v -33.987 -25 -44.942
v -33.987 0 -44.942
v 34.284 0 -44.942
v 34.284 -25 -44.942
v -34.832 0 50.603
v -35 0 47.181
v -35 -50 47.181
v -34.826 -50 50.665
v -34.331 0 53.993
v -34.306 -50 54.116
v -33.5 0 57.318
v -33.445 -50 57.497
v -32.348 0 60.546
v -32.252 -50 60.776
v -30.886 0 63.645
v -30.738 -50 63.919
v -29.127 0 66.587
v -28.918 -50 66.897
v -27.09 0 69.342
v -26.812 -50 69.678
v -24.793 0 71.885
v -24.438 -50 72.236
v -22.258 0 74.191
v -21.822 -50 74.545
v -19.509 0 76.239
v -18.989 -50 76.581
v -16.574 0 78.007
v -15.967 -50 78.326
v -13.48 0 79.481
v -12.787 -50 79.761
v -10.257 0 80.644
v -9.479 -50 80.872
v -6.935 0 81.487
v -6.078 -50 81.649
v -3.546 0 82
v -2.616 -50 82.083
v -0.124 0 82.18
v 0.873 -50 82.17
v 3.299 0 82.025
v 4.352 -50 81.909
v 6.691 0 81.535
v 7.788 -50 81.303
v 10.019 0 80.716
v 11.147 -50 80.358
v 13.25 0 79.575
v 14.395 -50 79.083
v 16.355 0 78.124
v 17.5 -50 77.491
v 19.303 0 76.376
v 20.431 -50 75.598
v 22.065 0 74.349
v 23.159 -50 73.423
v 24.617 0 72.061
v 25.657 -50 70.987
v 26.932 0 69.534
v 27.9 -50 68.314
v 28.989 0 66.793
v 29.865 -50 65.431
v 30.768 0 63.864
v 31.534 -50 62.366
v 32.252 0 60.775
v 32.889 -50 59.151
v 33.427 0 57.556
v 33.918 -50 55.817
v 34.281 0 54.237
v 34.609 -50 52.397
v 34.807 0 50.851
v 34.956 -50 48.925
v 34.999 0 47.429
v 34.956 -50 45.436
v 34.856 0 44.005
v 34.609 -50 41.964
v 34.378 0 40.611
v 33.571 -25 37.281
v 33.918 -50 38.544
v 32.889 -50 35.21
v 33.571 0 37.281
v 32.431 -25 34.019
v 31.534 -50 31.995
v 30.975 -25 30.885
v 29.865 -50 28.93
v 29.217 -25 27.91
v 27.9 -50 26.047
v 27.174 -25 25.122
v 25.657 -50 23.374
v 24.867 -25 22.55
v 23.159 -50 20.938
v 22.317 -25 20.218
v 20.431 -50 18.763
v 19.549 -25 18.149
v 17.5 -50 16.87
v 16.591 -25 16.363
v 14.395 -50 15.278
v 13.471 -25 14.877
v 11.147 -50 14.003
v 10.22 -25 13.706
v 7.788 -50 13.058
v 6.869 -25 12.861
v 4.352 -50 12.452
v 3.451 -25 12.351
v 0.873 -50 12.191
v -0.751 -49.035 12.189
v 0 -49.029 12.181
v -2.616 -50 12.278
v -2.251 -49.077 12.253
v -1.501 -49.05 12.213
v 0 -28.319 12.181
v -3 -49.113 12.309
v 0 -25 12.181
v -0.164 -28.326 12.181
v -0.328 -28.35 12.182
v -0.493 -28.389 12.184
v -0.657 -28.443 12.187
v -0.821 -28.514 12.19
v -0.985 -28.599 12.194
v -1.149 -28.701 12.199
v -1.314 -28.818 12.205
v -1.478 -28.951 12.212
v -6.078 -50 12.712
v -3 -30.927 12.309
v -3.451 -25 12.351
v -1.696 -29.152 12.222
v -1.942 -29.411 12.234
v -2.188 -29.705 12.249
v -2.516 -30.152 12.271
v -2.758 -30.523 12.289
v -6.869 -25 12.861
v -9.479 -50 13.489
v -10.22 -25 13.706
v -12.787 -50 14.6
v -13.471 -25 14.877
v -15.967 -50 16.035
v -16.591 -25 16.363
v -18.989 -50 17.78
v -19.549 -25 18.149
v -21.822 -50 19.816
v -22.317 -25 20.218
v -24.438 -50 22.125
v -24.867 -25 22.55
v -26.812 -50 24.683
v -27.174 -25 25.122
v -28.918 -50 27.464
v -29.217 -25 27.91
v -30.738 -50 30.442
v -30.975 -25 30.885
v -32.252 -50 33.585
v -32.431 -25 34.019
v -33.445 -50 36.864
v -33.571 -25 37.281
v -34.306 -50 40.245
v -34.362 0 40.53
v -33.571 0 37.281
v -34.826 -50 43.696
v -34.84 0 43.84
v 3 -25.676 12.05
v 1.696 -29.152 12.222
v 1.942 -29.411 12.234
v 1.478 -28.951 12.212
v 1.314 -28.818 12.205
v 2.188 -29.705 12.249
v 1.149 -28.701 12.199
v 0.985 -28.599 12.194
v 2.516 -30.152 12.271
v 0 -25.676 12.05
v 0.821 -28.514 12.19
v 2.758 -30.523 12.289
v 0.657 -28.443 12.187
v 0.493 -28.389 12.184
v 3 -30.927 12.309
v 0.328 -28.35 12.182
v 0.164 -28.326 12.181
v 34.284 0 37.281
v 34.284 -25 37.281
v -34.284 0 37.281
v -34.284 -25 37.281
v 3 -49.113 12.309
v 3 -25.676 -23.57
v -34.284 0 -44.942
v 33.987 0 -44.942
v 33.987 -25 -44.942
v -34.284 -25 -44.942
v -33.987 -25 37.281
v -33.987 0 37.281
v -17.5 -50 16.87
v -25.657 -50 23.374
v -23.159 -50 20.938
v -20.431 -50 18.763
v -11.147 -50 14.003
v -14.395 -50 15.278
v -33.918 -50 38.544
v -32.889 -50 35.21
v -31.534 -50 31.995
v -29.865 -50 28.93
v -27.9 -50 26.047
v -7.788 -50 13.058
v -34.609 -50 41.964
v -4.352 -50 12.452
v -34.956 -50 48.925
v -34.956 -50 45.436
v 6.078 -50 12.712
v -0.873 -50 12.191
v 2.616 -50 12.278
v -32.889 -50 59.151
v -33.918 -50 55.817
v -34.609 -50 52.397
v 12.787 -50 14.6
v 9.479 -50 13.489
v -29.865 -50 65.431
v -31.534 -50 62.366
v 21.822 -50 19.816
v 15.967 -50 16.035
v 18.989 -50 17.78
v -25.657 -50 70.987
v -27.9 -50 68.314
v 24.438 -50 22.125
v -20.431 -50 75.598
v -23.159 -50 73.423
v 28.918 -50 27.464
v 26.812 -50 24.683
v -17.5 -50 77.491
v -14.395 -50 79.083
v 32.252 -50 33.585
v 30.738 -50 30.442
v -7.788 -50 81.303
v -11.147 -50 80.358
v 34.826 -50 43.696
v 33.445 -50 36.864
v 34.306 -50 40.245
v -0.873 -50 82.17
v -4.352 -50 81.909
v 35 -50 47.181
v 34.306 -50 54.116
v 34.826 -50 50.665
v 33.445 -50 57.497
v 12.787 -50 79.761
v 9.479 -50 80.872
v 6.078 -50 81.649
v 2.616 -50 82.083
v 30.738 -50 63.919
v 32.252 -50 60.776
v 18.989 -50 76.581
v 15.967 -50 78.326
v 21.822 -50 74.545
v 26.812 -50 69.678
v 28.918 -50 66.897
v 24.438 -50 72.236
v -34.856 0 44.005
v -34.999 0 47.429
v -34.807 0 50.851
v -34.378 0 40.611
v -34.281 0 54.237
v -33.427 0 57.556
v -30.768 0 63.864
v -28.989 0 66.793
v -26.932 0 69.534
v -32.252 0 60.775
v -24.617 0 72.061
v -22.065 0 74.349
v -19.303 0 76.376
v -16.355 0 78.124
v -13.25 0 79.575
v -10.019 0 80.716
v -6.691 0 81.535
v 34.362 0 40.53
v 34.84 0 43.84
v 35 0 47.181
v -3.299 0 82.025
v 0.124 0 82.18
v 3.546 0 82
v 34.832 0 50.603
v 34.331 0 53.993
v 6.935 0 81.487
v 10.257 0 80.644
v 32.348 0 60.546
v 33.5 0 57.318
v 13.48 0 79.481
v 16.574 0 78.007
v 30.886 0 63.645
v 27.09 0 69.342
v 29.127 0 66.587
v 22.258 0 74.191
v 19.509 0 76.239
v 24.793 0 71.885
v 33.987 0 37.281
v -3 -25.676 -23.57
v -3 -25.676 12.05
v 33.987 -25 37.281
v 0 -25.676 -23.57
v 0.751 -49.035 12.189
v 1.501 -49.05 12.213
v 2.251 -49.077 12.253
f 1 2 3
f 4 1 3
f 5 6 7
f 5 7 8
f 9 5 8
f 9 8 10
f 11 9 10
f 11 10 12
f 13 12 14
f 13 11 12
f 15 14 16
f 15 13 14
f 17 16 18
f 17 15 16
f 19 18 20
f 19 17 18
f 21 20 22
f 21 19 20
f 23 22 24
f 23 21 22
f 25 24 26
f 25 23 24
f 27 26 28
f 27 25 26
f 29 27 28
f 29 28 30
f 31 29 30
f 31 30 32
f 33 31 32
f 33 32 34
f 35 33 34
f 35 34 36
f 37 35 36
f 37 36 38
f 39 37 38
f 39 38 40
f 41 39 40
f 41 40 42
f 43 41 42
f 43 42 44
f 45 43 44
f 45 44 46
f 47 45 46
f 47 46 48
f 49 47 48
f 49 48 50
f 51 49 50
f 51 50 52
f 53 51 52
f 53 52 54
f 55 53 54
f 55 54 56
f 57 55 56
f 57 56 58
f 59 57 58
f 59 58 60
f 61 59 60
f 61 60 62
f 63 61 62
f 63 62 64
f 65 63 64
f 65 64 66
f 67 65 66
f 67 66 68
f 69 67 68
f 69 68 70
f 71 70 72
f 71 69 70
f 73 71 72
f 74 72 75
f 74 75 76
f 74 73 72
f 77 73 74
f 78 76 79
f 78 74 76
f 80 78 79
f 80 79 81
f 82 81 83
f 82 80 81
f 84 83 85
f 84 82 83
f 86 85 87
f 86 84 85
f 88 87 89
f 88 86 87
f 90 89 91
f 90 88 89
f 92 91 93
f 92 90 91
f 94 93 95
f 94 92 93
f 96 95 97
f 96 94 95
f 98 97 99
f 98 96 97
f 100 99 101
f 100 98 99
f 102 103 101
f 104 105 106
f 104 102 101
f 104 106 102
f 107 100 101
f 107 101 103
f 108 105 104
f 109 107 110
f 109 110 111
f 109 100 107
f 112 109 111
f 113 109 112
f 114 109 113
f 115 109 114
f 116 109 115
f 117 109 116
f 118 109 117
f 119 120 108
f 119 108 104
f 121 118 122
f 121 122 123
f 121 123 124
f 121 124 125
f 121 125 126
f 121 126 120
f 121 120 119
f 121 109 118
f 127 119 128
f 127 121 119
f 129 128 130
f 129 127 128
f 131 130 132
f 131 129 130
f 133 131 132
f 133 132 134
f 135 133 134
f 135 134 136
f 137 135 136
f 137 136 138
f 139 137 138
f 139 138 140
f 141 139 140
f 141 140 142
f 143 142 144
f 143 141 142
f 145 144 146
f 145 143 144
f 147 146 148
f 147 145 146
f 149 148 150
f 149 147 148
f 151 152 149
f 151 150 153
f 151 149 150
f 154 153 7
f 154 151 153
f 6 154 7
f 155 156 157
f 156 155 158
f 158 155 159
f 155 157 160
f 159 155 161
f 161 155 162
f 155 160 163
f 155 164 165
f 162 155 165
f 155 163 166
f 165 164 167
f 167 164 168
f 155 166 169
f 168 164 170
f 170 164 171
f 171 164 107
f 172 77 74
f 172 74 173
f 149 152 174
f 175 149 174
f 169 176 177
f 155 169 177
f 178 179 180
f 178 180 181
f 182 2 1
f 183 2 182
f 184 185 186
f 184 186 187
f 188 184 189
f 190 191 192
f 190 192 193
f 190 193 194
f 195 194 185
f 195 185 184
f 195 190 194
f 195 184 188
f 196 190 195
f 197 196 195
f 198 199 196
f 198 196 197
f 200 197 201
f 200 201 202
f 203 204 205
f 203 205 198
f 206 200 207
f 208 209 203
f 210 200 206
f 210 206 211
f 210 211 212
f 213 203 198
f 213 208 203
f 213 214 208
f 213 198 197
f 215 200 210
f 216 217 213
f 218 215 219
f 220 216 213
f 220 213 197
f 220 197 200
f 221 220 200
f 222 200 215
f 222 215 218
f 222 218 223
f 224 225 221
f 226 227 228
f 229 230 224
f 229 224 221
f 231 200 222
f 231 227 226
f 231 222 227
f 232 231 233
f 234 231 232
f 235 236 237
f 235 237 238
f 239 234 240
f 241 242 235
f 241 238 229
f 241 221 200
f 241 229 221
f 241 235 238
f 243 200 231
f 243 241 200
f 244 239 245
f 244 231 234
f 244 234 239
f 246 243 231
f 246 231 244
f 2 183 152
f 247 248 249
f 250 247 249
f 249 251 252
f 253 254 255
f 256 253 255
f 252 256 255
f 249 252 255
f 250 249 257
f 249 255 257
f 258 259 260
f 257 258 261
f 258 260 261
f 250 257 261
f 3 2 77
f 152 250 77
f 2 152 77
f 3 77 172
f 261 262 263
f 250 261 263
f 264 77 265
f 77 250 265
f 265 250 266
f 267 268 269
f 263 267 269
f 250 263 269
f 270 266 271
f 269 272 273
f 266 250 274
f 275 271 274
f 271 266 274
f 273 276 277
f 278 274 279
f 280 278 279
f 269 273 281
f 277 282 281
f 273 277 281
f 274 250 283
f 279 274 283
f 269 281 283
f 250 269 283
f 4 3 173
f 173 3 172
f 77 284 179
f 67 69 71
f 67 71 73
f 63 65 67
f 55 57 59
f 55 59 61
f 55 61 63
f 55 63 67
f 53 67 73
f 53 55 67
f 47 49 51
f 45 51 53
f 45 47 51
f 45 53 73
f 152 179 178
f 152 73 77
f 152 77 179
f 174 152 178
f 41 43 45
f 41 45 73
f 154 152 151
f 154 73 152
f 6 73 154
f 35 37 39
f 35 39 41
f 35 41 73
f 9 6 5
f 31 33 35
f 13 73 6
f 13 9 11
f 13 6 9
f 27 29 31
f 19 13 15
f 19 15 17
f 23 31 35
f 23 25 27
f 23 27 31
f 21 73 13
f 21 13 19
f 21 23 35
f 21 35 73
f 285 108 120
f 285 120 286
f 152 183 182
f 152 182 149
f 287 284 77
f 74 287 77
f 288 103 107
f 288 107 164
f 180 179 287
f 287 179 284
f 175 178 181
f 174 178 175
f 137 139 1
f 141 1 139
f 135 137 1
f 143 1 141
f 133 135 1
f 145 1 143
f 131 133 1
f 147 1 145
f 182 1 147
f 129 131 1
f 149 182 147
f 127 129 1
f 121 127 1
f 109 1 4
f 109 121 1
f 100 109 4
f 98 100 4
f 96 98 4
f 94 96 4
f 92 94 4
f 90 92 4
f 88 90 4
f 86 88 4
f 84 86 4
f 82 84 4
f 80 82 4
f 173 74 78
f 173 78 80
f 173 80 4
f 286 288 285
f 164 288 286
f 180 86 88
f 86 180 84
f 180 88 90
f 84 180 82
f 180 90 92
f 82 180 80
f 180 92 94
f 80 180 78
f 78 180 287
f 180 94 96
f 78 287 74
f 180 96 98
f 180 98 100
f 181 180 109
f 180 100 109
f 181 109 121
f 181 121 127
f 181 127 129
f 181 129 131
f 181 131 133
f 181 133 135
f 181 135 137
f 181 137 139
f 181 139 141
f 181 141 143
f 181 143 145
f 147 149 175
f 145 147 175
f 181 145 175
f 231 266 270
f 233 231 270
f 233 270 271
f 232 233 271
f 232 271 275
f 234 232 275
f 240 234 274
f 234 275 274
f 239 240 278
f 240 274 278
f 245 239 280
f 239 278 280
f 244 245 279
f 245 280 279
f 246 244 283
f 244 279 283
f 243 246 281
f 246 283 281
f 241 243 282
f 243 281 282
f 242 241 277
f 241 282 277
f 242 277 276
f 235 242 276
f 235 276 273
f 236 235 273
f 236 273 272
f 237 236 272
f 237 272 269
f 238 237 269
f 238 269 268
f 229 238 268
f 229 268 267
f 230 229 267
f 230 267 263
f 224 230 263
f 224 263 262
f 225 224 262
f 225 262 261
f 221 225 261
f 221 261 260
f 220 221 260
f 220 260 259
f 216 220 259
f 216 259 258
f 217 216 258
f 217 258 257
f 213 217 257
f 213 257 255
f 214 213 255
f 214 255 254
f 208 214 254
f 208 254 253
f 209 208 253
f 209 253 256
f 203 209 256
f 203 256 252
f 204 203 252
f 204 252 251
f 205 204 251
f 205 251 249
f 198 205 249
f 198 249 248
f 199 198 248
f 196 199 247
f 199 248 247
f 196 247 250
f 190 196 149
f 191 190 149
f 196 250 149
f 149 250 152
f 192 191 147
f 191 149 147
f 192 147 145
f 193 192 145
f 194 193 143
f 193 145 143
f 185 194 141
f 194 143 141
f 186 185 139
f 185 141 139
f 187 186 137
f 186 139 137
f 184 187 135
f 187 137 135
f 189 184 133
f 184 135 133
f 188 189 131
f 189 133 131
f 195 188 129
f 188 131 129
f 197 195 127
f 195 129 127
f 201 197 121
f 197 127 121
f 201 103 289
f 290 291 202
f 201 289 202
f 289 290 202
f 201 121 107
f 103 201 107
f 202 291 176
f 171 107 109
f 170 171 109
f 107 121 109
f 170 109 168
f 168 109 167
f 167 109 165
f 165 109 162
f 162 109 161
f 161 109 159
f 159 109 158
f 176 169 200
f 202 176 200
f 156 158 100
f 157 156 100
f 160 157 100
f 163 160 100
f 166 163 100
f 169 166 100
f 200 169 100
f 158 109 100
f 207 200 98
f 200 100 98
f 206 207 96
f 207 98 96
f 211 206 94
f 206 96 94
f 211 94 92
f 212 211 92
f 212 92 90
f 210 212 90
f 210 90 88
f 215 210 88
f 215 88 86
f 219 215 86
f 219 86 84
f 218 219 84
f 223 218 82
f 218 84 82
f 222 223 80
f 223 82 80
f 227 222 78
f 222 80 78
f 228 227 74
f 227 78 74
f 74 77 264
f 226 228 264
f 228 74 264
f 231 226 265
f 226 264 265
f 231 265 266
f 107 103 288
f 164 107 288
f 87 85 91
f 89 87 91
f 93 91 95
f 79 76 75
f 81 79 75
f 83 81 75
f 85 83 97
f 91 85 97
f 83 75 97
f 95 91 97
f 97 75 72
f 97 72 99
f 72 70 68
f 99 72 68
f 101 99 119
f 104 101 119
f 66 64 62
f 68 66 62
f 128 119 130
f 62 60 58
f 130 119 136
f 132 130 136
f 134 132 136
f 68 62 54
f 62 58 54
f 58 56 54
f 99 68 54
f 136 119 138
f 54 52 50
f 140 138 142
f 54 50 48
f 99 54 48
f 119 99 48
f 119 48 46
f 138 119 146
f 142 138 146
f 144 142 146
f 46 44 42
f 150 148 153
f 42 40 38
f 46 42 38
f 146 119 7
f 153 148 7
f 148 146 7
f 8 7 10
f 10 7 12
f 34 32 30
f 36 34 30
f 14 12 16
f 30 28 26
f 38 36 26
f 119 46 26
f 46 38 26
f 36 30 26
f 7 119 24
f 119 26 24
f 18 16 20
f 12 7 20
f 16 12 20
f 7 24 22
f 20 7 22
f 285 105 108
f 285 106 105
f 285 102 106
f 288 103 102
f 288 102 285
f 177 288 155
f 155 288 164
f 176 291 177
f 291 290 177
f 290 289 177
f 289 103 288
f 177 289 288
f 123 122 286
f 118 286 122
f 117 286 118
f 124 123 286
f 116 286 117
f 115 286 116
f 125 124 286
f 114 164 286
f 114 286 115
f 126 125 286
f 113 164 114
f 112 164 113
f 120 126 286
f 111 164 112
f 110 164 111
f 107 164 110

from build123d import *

# Parameters (mm, degrees)
F0_R     = 35
F1_DEPTH = 50
F2_W     = 68.271753
F2_H     = 82.222935
F3_DEPTH = 25
F5_DEPTH = 3


with BuildPart() as f1:
    # F0 (on Front) → F1 (new body)
    with BuildSketch(Plane.XZ):
        with Locations((0, 47.180508)):
            Circle(F0_R)
    extrude(amount=F1_DEPTH)

    # F2 (on Front) → F3 (join)
    with BuildSketch(Plane.XZ):
        with Locations((0.148417, -3.830592)):
            Rectangle(F2_W, F2_H)
    extrude(amount=F3_DEPTH)

    # F4 (on Right) → F5 (join)
    with BuildSketch(Plane.YZ):
        Polygon((-25.676114, 12.050013), (-49.719643, 13.237347), (-25.676114, -23.570031), align=None)
    extrude(amount=F5_DEPTH)


with BuildPart() as f6_1:
    # F6: instance of F1
    add(f1.part.mirror(Plane(origin=(0, -33.463358, 0.258755), x_dir=(0, 1, 0), z_dir=(-1, 0, 0))))


solid = Compound([f1.part, f6_1.part])
